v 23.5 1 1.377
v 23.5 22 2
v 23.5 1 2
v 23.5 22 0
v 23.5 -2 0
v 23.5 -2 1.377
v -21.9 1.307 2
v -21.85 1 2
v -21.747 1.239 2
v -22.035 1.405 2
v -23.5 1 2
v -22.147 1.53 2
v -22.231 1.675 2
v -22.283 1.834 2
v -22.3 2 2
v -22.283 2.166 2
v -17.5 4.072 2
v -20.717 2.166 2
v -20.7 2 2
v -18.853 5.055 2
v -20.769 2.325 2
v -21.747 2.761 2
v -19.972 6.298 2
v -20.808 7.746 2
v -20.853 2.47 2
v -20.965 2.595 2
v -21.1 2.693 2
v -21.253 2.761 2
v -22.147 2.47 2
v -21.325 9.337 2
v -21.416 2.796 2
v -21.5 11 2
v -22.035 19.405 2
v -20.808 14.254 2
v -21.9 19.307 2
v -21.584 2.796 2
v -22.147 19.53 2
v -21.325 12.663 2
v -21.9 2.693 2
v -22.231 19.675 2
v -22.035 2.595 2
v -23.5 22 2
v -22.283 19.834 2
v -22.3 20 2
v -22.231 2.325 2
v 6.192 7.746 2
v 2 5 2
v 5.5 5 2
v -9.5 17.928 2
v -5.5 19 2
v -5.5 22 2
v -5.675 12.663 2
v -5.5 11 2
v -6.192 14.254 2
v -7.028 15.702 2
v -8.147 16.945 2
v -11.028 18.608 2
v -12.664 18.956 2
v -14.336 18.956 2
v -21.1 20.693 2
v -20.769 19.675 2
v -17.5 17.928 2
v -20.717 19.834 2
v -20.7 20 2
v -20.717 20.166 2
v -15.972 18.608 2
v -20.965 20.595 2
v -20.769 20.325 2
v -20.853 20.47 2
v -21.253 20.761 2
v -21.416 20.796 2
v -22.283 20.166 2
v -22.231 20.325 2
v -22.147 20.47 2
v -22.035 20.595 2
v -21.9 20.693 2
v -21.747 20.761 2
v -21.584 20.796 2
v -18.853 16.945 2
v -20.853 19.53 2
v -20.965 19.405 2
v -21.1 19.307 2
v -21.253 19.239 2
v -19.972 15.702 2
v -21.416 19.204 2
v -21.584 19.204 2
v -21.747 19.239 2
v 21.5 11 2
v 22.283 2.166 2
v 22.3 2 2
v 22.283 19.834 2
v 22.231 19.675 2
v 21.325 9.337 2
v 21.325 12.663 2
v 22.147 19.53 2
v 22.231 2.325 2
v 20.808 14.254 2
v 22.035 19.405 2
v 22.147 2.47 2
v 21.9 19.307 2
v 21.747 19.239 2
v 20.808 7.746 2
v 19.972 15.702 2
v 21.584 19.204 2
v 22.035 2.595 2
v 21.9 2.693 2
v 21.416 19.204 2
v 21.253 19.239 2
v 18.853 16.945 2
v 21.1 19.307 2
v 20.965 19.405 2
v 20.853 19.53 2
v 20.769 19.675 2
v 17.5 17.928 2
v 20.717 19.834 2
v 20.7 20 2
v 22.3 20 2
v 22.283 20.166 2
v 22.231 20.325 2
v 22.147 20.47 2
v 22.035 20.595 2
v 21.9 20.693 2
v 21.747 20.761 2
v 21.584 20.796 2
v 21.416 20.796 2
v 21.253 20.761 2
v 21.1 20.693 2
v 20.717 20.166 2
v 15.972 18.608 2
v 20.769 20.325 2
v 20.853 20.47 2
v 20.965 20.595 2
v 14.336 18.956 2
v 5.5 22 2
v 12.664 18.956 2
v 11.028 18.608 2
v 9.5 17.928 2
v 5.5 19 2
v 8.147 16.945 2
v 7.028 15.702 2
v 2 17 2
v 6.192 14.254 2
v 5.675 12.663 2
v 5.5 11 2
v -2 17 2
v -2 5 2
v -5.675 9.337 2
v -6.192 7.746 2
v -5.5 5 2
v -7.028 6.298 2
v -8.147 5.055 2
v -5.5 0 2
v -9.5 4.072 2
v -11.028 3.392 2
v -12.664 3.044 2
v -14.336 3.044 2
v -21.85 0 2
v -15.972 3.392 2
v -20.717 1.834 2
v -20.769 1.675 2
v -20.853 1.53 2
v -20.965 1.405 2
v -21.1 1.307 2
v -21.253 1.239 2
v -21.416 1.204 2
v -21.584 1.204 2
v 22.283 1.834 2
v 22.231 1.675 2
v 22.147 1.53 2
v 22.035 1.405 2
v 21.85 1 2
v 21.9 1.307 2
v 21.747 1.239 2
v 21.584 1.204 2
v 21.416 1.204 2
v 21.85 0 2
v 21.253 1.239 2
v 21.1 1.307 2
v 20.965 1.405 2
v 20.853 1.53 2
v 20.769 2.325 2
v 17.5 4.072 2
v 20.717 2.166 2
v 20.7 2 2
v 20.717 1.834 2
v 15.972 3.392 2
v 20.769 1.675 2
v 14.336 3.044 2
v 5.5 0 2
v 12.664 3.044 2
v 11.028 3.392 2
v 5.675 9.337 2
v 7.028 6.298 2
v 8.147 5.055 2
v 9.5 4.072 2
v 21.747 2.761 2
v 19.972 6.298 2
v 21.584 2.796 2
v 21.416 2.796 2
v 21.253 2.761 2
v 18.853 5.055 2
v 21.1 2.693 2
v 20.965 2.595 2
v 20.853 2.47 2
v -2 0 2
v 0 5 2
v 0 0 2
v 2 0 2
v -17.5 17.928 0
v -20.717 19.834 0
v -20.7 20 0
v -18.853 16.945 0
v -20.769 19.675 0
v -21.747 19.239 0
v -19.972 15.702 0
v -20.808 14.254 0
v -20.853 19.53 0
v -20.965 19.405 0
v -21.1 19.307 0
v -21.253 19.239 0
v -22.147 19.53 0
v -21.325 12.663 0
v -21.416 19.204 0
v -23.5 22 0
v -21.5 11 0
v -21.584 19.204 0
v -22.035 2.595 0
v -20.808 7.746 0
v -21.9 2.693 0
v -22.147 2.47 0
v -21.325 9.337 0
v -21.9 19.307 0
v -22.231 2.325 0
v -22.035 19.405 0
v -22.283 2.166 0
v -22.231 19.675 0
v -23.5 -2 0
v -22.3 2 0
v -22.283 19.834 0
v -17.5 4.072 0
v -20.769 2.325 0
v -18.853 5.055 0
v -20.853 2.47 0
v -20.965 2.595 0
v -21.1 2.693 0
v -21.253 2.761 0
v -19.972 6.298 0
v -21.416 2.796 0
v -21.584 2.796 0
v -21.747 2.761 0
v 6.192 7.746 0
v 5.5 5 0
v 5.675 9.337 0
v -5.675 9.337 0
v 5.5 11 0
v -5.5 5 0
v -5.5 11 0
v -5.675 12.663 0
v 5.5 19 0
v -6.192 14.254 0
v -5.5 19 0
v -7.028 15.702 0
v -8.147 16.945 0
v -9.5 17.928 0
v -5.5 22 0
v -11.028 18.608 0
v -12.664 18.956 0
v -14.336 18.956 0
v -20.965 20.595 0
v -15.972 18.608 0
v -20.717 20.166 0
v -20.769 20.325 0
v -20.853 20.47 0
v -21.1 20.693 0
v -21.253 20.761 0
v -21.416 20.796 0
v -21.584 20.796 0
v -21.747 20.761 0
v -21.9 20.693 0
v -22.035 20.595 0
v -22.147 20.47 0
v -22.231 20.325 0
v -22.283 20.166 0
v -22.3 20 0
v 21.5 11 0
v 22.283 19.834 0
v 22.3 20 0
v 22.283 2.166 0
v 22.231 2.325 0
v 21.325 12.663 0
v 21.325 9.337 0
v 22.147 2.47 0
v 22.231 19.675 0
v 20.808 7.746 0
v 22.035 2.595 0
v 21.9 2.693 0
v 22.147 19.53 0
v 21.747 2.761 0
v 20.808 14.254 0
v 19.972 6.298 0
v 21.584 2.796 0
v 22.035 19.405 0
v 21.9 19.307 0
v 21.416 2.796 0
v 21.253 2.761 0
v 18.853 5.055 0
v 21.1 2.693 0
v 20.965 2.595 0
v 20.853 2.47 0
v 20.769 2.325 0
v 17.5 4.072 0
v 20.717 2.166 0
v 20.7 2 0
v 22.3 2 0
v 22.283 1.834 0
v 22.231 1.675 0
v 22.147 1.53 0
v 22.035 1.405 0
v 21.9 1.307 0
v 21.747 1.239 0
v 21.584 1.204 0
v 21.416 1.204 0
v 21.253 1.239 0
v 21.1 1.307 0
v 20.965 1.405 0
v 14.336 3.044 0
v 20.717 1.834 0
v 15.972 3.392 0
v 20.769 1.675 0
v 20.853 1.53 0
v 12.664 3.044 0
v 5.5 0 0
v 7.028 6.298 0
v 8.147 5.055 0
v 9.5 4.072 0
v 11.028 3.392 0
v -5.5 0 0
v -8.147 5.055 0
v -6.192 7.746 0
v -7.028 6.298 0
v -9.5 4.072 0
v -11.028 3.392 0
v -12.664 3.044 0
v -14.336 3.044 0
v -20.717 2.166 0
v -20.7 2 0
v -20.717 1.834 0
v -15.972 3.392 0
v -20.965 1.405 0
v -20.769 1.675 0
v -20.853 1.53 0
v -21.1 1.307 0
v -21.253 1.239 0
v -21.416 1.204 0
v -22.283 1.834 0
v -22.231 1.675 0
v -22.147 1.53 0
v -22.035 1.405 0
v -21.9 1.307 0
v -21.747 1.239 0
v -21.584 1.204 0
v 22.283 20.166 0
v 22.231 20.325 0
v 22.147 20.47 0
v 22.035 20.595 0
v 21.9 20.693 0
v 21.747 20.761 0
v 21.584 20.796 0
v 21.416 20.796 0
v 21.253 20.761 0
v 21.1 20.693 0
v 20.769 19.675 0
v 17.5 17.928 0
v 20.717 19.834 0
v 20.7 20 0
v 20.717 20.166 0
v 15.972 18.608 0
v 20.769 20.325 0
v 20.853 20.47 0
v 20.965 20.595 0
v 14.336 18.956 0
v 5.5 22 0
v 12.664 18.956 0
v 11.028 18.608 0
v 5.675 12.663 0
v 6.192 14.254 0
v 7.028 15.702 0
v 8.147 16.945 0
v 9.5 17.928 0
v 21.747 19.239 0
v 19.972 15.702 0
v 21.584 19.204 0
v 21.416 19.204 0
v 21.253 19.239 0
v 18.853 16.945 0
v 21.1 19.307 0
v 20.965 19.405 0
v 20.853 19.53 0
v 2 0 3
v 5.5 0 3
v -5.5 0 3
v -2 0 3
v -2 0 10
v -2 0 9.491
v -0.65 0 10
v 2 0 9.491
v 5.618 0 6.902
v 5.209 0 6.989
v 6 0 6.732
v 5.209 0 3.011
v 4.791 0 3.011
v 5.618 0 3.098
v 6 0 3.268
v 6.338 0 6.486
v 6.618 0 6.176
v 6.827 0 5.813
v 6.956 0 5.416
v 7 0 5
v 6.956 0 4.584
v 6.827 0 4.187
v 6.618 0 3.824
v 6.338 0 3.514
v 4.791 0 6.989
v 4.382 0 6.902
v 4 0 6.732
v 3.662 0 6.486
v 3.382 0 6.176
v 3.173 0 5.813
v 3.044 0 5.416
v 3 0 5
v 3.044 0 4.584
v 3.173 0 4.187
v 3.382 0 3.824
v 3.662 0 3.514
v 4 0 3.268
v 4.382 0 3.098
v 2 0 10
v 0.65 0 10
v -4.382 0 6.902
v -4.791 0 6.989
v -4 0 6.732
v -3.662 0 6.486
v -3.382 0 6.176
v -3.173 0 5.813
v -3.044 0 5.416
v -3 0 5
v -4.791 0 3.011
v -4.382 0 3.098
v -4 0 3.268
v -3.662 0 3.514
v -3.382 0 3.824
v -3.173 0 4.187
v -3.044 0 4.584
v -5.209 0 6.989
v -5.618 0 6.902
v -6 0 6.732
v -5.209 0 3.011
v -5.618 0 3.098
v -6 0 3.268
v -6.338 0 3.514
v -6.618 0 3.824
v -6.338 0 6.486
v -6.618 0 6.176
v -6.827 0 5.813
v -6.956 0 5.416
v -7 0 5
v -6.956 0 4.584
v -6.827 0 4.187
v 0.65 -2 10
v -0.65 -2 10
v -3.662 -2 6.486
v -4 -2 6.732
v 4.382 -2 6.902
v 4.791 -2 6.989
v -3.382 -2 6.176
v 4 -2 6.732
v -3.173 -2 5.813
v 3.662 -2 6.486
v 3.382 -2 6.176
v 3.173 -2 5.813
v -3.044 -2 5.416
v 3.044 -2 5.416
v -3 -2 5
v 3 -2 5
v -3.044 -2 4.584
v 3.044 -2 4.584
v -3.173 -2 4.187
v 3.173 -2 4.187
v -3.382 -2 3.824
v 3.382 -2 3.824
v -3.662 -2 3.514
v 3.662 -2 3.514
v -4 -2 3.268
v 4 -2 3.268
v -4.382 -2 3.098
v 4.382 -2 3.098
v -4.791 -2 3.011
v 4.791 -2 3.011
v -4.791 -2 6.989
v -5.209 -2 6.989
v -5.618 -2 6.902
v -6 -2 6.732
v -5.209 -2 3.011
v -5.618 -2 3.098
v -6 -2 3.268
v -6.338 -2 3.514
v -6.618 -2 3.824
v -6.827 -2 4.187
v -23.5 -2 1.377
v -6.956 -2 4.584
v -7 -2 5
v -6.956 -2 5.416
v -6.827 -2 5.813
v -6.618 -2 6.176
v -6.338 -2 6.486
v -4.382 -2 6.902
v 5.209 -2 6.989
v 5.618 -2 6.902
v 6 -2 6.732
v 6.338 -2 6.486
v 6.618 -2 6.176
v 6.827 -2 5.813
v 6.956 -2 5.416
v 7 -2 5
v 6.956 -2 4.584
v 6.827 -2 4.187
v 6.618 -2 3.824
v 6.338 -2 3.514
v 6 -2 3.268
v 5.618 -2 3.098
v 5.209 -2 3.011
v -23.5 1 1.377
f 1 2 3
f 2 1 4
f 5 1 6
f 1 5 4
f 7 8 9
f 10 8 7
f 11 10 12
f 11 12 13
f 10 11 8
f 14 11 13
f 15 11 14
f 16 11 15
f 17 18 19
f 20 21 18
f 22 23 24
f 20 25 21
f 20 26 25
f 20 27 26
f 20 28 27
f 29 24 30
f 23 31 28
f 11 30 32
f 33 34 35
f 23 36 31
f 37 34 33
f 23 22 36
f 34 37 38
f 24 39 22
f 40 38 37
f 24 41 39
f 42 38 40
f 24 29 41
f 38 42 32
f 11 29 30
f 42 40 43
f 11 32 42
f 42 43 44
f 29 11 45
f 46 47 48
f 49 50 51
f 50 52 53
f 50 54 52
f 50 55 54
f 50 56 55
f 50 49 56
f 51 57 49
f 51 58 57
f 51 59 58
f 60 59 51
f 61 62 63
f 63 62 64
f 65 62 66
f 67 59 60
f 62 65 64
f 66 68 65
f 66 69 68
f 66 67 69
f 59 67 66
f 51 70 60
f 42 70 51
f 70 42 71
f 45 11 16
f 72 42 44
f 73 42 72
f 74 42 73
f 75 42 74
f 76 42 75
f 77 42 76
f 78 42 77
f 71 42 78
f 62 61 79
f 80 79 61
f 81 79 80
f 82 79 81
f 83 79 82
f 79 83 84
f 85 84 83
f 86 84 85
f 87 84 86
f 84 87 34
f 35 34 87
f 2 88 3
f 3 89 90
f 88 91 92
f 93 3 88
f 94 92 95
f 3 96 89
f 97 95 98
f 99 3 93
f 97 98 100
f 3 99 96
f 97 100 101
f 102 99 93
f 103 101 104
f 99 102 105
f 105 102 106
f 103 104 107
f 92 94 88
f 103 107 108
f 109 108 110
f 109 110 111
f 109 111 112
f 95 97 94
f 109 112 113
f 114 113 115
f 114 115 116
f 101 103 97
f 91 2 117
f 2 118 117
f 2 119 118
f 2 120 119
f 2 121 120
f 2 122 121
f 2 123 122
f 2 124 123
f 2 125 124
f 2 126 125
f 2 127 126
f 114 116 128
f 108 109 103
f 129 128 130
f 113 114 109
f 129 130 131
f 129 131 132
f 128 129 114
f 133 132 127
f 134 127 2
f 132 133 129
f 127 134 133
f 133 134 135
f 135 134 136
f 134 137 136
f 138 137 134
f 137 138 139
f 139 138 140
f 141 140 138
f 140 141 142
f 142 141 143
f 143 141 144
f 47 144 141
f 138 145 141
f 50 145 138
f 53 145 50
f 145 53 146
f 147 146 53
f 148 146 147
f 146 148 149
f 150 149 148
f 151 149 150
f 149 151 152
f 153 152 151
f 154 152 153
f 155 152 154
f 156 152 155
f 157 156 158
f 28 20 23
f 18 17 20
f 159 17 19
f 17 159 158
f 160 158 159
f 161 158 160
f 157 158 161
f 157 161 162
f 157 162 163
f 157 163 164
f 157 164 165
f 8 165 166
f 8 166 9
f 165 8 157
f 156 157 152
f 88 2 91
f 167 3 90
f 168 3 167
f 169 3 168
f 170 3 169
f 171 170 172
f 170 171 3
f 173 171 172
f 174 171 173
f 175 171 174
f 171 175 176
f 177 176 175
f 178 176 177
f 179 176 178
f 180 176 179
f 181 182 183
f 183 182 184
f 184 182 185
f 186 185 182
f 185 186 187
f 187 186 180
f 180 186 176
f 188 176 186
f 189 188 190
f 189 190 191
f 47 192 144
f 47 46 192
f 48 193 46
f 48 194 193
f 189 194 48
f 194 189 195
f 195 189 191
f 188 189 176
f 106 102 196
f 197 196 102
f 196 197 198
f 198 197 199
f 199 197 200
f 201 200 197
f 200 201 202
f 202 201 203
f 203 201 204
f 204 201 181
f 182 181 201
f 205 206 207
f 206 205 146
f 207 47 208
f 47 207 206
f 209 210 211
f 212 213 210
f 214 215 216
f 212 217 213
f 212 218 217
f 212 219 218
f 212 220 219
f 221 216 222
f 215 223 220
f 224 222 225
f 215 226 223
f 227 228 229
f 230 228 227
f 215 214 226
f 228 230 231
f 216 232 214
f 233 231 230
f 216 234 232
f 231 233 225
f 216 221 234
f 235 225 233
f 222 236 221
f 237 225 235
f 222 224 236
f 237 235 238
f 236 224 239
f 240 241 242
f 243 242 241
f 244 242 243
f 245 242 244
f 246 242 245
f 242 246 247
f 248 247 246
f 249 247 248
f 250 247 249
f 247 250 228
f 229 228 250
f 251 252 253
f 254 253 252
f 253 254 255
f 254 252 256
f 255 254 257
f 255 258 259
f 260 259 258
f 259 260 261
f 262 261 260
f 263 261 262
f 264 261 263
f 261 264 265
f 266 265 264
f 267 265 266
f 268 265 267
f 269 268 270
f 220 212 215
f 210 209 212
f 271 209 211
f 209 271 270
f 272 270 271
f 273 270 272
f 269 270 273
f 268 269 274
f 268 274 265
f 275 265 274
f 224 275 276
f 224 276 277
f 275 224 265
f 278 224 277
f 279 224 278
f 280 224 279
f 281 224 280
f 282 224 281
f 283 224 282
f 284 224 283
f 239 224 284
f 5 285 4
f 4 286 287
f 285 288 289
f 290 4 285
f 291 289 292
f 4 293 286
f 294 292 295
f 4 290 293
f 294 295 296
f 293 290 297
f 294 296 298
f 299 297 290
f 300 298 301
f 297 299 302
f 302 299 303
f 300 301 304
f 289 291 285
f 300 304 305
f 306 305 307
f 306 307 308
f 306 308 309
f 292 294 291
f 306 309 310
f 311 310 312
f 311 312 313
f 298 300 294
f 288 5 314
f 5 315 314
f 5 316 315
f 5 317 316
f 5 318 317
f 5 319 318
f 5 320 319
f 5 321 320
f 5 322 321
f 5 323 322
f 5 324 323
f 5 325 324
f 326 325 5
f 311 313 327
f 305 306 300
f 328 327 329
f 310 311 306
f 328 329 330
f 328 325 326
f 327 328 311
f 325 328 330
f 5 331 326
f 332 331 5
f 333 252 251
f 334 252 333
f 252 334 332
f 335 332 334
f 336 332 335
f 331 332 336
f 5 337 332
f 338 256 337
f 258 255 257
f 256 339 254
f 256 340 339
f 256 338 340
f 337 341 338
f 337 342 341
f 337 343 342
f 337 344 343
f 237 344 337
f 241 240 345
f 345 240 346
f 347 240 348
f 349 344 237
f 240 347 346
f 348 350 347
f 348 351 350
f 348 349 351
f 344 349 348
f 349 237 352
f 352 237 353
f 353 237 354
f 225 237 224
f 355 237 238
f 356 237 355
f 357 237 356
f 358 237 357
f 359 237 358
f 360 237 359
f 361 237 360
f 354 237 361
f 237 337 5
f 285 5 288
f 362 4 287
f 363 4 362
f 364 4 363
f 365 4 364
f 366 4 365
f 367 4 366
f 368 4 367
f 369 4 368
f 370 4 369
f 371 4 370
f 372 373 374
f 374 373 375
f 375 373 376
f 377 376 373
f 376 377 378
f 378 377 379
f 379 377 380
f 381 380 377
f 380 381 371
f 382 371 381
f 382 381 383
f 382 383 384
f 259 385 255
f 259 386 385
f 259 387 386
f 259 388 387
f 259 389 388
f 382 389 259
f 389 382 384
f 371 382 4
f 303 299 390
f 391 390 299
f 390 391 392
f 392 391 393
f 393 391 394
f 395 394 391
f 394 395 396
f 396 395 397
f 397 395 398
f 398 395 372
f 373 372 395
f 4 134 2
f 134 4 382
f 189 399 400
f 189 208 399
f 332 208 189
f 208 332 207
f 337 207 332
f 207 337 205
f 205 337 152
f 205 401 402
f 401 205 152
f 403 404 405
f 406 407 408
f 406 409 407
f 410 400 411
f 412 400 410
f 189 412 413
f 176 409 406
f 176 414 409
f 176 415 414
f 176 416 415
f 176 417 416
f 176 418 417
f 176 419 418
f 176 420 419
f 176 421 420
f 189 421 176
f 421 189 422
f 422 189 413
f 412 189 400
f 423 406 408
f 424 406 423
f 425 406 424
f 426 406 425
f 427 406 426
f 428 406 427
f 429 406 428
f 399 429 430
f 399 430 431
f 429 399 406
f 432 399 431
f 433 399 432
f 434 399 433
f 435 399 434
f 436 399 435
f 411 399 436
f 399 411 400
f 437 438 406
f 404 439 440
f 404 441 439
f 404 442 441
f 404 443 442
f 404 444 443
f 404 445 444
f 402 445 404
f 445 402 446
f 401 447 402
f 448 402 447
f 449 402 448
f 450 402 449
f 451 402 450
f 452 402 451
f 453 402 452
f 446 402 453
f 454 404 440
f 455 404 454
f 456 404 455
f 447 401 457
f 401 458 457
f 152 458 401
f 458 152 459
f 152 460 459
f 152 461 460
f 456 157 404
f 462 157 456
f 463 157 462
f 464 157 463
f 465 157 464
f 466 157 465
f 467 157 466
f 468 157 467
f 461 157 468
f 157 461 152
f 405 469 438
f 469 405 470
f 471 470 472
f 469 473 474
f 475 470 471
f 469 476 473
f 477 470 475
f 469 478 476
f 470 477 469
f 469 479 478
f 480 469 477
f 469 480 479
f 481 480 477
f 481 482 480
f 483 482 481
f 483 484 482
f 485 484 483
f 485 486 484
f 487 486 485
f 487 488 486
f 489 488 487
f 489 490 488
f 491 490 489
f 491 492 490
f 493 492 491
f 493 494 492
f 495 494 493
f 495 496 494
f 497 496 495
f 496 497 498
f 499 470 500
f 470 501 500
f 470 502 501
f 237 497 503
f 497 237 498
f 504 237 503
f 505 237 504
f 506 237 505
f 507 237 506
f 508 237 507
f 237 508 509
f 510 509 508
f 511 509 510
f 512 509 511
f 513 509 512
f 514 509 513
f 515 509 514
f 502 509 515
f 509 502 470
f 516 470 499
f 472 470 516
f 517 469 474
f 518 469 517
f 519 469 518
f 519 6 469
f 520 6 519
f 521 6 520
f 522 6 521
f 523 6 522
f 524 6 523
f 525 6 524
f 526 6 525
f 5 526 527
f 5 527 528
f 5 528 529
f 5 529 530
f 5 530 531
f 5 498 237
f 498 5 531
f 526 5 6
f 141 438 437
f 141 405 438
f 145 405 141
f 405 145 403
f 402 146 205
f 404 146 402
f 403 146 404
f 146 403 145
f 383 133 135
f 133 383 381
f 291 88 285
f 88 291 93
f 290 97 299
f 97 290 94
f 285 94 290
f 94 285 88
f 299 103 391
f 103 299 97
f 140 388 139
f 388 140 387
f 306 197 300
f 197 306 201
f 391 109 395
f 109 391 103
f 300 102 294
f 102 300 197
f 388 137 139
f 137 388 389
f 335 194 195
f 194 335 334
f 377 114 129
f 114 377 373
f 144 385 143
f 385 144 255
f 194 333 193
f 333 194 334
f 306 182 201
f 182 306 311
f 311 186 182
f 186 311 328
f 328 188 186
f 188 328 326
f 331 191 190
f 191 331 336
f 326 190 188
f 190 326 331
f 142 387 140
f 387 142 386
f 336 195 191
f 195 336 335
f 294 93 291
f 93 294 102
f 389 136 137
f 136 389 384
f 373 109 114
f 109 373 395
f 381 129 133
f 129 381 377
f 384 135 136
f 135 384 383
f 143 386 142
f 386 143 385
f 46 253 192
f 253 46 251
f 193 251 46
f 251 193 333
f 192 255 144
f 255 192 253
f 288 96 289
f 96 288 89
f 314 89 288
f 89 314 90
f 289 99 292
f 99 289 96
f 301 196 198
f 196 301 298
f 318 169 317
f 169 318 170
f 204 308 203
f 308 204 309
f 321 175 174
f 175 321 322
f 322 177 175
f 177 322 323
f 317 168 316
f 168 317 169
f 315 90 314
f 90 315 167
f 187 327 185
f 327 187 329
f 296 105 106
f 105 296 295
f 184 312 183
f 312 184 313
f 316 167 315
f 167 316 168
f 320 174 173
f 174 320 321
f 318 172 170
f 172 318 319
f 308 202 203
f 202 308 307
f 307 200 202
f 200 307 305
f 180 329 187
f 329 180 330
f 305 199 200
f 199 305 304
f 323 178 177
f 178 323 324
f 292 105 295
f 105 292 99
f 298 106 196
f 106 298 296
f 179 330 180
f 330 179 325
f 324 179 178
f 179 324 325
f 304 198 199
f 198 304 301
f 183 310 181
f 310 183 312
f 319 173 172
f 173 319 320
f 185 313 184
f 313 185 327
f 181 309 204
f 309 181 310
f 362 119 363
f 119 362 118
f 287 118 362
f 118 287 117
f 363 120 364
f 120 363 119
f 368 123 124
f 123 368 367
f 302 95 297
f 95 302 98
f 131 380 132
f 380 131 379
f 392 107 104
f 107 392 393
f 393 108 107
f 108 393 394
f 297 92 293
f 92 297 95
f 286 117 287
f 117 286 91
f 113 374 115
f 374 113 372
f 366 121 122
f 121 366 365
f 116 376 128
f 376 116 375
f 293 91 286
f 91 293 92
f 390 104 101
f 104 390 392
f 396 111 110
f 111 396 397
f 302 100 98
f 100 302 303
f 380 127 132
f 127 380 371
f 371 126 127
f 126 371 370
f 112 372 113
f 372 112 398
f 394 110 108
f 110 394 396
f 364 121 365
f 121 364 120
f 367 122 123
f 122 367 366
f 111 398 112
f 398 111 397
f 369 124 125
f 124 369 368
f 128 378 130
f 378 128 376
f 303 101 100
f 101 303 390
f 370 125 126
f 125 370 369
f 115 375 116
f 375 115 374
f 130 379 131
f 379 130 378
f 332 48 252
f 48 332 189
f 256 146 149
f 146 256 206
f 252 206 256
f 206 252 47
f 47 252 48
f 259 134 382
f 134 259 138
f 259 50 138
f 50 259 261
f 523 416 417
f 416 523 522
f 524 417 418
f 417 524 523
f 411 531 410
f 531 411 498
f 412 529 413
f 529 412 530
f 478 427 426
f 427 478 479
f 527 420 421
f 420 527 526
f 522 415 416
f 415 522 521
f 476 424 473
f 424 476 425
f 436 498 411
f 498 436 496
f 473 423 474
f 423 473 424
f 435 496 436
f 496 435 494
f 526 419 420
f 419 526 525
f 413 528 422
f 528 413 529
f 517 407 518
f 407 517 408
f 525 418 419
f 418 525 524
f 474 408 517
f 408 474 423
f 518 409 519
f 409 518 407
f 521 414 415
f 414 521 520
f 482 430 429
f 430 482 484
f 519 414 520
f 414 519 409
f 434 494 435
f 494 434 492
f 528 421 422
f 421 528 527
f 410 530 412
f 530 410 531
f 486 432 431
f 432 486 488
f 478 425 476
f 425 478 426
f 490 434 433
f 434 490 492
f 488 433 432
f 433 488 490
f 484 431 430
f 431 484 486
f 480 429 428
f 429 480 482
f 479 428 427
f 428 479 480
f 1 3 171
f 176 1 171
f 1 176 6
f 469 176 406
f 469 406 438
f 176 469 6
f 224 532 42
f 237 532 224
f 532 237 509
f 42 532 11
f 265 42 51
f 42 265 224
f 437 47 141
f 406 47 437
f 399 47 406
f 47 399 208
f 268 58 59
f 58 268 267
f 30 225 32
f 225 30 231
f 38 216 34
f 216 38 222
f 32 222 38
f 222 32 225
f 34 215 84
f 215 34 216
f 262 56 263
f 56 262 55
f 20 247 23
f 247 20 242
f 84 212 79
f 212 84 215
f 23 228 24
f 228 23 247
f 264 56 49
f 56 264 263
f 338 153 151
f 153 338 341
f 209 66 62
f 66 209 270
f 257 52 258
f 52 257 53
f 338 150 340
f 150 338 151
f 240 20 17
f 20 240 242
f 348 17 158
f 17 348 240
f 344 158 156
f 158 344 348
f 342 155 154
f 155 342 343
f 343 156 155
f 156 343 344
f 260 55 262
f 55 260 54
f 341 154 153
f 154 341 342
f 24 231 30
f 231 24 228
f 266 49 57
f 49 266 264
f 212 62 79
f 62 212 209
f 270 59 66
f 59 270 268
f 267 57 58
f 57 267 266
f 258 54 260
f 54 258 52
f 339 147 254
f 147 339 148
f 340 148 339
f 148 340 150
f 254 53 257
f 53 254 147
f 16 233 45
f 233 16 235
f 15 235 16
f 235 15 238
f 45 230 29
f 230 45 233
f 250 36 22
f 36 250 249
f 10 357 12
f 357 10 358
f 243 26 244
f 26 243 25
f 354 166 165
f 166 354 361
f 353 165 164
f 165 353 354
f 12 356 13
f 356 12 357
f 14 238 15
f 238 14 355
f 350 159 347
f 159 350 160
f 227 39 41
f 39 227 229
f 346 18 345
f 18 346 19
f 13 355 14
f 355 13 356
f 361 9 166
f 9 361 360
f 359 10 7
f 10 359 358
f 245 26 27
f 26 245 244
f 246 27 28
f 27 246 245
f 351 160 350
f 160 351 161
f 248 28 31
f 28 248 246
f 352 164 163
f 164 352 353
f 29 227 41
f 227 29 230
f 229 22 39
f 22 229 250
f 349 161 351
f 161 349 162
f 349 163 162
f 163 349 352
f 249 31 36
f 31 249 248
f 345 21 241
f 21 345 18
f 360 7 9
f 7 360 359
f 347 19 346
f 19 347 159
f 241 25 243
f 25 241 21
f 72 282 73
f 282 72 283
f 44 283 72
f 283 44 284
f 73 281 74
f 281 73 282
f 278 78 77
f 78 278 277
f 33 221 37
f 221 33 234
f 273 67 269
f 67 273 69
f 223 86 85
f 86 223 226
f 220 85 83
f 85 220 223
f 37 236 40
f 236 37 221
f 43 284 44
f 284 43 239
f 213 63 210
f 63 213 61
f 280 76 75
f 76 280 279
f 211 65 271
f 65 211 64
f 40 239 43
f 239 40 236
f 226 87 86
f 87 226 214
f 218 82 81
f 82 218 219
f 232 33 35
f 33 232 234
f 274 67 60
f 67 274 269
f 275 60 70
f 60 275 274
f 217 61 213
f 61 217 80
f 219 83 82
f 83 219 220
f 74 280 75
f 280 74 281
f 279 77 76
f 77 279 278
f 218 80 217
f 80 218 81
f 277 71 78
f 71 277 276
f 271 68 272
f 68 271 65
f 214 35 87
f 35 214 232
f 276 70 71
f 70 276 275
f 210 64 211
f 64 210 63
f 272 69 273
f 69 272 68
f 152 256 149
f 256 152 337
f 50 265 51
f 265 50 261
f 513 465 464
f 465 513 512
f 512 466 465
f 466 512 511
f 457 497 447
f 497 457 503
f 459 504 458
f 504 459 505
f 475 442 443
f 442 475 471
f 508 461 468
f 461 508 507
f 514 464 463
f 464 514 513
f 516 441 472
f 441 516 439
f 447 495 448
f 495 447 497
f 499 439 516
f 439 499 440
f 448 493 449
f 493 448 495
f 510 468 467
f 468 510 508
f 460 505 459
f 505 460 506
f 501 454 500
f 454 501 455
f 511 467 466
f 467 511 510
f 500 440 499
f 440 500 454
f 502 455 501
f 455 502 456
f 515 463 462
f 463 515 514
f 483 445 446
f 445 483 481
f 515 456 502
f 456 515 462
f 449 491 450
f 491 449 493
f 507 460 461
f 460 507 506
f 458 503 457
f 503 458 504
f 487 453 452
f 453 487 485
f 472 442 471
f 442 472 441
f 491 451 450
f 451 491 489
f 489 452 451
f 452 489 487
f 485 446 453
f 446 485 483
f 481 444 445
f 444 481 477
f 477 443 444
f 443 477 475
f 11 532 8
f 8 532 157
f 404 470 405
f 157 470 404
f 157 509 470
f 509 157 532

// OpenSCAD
$fn = 30;
ow = 45 + 2;   // original width
oh = 20 + 2;   // original height
or = 8;    // transmitter radius
dr = 27;   // distance between center of transmiters
thickness = 2   ; // thickness
shr = 0.8;       // screw hole diameter
shdx = 43;    // screw hole distance x
shdy = 18;    // screw hole distance y
cw   = 11;    // crystall width
ch   = 5;     // crystall height

ph = 3;    // pins height
bt = 2;    // base thickness
bh = 10;    // base height
$fn = 30;

bhr = 2;    // base hole radius
bhd = 10;   // base holes distance
bhs = 3;    // base hole distance to the wall 

module half() {
    union() {
    difference() {
        union() {
            // main cube
            cube([ow / 2, oh, thickness]);
          
          // base   
            translate([0,  - bt, 0])
                cube([ow / 2, bt, bh]);
           rotate(a = -90, v=[0, 1, 0])
                linear_extrude(height = 2)   
                polygon(points=[
                    [thickness , 0], 
                    [bh, 0],
                    [thickness, oh - ch]]);  
          
        }
        
        // cylinder
        translate([dr / 2, oh / 2, -1]) {
            cylinder(h = thickness + 2, r = or);};
        
       // lower screw hole    
       translate([shdx / 2, (oh - shdy) / 2, 1]) 
           cylinder(h = thickness + 2, r= shr, center=true);

       // upper screw hole
       translate([shdx / 2, (oh + shdy) / 2, 1]) 
           cylinder(h = thickness + 2, r= shr, center=true);

        // crystal hole
       translate([0, 0, -1]) 
            cube([cw / 2, ch, thickness + 2]);
            
       // pin hole     
       translate([0, (oh - ph) , -2]) 
            cube([cw / 2, ph + 1, thickness + 3]);
            
        // base screw hole
       translate([bhd / 2, +1, bhr  + bhs])
            rotate(a = 90, v = [1, 0, 0]) 
                cylinder(r = bhr, h = bt + 2);

       translate([+1, -bt - 1 , thickness / 2]) {
            rotate (a = -90, v=[1, 0, 0]) 
             linear_extrude(height = bt + 2)
                polygon(points=[
                [+ow  / 2 , -oh / 2], 
                [+ow  / 2, 0],
                [-3, -10]]);
         }
                
              
       }  
    }
}

half();
mirror (v=[1, 0, 0]) half();
